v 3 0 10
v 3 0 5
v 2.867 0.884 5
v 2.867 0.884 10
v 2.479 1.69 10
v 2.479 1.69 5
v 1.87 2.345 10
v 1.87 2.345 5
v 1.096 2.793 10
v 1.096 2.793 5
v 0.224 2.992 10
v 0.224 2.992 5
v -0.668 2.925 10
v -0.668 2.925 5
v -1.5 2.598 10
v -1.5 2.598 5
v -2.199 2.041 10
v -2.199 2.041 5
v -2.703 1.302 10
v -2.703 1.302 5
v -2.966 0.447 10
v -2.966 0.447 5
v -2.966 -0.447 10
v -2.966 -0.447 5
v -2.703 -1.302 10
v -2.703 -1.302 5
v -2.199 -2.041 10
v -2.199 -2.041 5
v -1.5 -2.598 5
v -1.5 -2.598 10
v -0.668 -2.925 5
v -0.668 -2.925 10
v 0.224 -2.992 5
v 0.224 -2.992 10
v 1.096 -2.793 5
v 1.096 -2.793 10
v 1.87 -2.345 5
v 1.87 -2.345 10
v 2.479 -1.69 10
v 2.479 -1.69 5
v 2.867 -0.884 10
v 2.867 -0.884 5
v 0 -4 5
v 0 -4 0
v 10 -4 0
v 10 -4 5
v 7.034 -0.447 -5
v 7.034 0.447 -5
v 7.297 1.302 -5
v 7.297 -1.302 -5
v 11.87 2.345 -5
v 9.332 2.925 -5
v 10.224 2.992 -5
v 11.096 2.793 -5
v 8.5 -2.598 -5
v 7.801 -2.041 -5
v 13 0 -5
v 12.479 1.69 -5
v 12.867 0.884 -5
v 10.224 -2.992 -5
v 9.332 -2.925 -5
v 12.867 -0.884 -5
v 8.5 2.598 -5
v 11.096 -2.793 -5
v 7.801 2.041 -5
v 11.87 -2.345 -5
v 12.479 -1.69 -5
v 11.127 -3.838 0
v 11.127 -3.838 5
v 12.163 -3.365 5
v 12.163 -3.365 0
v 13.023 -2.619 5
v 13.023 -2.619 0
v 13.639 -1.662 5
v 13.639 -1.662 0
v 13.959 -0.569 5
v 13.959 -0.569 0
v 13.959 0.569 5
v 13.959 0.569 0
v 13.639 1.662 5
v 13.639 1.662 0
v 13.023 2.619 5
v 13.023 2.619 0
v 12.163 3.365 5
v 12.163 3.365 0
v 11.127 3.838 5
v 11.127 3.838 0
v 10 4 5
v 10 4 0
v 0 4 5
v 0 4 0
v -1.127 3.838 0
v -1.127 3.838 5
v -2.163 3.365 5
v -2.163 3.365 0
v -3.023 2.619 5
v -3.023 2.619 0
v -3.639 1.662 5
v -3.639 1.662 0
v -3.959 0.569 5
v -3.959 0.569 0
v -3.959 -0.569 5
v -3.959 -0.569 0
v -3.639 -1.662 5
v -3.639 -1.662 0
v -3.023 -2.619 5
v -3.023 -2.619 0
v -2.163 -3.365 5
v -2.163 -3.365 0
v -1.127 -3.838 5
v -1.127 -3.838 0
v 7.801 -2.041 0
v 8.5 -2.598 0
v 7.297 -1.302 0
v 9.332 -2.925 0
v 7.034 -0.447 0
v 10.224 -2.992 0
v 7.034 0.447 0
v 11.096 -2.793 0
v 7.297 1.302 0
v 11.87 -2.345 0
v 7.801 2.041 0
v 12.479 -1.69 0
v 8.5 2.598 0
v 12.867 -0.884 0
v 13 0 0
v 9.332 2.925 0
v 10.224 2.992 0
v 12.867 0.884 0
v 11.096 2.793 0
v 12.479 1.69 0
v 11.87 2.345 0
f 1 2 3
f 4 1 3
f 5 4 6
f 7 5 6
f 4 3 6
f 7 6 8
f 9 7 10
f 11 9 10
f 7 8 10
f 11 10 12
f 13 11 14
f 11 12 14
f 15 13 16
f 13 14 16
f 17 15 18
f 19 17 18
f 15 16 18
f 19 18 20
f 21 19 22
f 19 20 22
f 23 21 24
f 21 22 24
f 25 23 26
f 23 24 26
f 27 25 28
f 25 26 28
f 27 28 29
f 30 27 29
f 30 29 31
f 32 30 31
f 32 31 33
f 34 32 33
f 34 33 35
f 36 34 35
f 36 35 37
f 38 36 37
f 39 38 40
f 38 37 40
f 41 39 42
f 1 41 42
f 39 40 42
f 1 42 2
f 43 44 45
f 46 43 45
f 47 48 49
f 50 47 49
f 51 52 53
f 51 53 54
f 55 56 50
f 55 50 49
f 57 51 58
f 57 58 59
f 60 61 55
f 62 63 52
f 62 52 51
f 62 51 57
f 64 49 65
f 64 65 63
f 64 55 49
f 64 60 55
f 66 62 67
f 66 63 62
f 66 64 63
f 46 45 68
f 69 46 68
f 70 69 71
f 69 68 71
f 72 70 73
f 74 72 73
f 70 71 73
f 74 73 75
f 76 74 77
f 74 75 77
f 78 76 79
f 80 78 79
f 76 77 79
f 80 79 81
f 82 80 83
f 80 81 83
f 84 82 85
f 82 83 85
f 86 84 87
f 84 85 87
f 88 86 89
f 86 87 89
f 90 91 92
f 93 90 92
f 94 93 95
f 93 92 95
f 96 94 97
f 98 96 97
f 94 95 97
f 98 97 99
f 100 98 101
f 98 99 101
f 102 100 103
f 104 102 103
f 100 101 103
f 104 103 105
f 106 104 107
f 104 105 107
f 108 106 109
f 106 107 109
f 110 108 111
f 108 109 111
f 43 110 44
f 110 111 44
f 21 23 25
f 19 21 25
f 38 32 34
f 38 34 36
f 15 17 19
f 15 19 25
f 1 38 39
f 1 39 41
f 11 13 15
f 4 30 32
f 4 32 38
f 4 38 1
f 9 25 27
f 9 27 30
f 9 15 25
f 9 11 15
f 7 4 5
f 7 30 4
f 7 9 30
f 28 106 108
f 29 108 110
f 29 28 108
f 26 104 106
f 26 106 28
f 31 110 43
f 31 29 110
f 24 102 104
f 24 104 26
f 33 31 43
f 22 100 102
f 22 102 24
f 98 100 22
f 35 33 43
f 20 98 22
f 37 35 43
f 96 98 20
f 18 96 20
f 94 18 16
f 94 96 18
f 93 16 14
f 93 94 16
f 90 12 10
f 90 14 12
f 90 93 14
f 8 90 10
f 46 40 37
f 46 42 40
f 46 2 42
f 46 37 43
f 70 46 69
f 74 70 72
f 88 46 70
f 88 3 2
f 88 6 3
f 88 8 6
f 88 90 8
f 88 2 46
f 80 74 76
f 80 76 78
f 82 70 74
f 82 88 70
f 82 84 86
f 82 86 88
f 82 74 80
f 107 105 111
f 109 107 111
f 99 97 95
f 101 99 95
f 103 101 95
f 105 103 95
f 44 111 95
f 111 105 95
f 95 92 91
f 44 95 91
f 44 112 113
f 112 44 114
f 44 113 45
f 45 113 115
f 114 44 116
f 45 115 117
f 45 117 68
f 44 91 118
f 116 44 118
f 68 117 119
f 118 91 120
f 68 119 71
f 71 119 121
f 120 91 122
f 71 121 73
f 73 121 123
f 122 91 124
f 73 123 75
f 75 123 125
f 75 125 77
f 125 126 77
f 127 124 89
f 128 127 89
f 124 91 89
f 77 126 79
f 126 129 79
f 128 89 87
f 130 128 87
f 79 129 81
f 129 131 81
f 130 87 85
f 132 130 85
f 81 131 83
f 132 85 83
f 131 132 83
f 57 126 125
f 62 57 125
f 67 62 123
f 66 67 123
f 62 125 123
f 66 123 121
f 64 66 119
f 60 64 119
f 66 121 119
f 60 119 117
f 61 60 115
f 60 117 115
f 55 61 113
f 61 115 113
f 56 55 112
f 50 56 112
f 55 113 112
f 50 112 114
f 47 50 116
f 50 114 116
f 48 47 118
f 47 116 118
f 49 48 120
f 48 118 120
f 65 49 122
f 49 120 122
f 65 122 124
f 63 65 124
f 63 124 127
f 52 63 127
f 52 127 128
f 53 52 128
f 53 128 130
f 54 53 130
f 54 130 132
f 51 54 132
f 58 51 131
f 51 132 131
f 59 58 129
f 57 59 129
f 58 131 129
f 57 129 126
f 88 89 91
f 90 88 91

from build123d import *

# Parameters (mm, degrees)
F1_DEPTH = 5
F2_R     = 3
F3_DEPTH = 5
F4_R     = 3
F5_DEPTH = 5


with BuildPart() as f1:
    # F0 (on Top) → F1 (new body)
    with BuildSketch(Plane.XY):
        with BuildLine():
            ThreePointArc((0, 4), (-4, 0), (0, -4))
            Line((0, -4), (10, -4))
            ThreePointArc((10, -4), (14, 0), (10, 4))
            Line((10, 4), (0, 4))
        make_face()
    extrude(amount=F1_DEPTH)

    # F2 (on face) → F3 (join)
    with BuildSketch(Plane.XY.offset(5)):
        Circle(F2_R)
    extrude(amount=F3_DEPTH)

    # F4 (on face) → F5 (join)
    with BuildSketch(Plane(origin=(0, 0, 0), x_dir=(1, 0, 0), z_dir=(0, 0, -1))):
        with Locations((10, 0)):
            Circle(F4_R)
    extrude(amount=F5_DEPTH)


solid = f1.part
